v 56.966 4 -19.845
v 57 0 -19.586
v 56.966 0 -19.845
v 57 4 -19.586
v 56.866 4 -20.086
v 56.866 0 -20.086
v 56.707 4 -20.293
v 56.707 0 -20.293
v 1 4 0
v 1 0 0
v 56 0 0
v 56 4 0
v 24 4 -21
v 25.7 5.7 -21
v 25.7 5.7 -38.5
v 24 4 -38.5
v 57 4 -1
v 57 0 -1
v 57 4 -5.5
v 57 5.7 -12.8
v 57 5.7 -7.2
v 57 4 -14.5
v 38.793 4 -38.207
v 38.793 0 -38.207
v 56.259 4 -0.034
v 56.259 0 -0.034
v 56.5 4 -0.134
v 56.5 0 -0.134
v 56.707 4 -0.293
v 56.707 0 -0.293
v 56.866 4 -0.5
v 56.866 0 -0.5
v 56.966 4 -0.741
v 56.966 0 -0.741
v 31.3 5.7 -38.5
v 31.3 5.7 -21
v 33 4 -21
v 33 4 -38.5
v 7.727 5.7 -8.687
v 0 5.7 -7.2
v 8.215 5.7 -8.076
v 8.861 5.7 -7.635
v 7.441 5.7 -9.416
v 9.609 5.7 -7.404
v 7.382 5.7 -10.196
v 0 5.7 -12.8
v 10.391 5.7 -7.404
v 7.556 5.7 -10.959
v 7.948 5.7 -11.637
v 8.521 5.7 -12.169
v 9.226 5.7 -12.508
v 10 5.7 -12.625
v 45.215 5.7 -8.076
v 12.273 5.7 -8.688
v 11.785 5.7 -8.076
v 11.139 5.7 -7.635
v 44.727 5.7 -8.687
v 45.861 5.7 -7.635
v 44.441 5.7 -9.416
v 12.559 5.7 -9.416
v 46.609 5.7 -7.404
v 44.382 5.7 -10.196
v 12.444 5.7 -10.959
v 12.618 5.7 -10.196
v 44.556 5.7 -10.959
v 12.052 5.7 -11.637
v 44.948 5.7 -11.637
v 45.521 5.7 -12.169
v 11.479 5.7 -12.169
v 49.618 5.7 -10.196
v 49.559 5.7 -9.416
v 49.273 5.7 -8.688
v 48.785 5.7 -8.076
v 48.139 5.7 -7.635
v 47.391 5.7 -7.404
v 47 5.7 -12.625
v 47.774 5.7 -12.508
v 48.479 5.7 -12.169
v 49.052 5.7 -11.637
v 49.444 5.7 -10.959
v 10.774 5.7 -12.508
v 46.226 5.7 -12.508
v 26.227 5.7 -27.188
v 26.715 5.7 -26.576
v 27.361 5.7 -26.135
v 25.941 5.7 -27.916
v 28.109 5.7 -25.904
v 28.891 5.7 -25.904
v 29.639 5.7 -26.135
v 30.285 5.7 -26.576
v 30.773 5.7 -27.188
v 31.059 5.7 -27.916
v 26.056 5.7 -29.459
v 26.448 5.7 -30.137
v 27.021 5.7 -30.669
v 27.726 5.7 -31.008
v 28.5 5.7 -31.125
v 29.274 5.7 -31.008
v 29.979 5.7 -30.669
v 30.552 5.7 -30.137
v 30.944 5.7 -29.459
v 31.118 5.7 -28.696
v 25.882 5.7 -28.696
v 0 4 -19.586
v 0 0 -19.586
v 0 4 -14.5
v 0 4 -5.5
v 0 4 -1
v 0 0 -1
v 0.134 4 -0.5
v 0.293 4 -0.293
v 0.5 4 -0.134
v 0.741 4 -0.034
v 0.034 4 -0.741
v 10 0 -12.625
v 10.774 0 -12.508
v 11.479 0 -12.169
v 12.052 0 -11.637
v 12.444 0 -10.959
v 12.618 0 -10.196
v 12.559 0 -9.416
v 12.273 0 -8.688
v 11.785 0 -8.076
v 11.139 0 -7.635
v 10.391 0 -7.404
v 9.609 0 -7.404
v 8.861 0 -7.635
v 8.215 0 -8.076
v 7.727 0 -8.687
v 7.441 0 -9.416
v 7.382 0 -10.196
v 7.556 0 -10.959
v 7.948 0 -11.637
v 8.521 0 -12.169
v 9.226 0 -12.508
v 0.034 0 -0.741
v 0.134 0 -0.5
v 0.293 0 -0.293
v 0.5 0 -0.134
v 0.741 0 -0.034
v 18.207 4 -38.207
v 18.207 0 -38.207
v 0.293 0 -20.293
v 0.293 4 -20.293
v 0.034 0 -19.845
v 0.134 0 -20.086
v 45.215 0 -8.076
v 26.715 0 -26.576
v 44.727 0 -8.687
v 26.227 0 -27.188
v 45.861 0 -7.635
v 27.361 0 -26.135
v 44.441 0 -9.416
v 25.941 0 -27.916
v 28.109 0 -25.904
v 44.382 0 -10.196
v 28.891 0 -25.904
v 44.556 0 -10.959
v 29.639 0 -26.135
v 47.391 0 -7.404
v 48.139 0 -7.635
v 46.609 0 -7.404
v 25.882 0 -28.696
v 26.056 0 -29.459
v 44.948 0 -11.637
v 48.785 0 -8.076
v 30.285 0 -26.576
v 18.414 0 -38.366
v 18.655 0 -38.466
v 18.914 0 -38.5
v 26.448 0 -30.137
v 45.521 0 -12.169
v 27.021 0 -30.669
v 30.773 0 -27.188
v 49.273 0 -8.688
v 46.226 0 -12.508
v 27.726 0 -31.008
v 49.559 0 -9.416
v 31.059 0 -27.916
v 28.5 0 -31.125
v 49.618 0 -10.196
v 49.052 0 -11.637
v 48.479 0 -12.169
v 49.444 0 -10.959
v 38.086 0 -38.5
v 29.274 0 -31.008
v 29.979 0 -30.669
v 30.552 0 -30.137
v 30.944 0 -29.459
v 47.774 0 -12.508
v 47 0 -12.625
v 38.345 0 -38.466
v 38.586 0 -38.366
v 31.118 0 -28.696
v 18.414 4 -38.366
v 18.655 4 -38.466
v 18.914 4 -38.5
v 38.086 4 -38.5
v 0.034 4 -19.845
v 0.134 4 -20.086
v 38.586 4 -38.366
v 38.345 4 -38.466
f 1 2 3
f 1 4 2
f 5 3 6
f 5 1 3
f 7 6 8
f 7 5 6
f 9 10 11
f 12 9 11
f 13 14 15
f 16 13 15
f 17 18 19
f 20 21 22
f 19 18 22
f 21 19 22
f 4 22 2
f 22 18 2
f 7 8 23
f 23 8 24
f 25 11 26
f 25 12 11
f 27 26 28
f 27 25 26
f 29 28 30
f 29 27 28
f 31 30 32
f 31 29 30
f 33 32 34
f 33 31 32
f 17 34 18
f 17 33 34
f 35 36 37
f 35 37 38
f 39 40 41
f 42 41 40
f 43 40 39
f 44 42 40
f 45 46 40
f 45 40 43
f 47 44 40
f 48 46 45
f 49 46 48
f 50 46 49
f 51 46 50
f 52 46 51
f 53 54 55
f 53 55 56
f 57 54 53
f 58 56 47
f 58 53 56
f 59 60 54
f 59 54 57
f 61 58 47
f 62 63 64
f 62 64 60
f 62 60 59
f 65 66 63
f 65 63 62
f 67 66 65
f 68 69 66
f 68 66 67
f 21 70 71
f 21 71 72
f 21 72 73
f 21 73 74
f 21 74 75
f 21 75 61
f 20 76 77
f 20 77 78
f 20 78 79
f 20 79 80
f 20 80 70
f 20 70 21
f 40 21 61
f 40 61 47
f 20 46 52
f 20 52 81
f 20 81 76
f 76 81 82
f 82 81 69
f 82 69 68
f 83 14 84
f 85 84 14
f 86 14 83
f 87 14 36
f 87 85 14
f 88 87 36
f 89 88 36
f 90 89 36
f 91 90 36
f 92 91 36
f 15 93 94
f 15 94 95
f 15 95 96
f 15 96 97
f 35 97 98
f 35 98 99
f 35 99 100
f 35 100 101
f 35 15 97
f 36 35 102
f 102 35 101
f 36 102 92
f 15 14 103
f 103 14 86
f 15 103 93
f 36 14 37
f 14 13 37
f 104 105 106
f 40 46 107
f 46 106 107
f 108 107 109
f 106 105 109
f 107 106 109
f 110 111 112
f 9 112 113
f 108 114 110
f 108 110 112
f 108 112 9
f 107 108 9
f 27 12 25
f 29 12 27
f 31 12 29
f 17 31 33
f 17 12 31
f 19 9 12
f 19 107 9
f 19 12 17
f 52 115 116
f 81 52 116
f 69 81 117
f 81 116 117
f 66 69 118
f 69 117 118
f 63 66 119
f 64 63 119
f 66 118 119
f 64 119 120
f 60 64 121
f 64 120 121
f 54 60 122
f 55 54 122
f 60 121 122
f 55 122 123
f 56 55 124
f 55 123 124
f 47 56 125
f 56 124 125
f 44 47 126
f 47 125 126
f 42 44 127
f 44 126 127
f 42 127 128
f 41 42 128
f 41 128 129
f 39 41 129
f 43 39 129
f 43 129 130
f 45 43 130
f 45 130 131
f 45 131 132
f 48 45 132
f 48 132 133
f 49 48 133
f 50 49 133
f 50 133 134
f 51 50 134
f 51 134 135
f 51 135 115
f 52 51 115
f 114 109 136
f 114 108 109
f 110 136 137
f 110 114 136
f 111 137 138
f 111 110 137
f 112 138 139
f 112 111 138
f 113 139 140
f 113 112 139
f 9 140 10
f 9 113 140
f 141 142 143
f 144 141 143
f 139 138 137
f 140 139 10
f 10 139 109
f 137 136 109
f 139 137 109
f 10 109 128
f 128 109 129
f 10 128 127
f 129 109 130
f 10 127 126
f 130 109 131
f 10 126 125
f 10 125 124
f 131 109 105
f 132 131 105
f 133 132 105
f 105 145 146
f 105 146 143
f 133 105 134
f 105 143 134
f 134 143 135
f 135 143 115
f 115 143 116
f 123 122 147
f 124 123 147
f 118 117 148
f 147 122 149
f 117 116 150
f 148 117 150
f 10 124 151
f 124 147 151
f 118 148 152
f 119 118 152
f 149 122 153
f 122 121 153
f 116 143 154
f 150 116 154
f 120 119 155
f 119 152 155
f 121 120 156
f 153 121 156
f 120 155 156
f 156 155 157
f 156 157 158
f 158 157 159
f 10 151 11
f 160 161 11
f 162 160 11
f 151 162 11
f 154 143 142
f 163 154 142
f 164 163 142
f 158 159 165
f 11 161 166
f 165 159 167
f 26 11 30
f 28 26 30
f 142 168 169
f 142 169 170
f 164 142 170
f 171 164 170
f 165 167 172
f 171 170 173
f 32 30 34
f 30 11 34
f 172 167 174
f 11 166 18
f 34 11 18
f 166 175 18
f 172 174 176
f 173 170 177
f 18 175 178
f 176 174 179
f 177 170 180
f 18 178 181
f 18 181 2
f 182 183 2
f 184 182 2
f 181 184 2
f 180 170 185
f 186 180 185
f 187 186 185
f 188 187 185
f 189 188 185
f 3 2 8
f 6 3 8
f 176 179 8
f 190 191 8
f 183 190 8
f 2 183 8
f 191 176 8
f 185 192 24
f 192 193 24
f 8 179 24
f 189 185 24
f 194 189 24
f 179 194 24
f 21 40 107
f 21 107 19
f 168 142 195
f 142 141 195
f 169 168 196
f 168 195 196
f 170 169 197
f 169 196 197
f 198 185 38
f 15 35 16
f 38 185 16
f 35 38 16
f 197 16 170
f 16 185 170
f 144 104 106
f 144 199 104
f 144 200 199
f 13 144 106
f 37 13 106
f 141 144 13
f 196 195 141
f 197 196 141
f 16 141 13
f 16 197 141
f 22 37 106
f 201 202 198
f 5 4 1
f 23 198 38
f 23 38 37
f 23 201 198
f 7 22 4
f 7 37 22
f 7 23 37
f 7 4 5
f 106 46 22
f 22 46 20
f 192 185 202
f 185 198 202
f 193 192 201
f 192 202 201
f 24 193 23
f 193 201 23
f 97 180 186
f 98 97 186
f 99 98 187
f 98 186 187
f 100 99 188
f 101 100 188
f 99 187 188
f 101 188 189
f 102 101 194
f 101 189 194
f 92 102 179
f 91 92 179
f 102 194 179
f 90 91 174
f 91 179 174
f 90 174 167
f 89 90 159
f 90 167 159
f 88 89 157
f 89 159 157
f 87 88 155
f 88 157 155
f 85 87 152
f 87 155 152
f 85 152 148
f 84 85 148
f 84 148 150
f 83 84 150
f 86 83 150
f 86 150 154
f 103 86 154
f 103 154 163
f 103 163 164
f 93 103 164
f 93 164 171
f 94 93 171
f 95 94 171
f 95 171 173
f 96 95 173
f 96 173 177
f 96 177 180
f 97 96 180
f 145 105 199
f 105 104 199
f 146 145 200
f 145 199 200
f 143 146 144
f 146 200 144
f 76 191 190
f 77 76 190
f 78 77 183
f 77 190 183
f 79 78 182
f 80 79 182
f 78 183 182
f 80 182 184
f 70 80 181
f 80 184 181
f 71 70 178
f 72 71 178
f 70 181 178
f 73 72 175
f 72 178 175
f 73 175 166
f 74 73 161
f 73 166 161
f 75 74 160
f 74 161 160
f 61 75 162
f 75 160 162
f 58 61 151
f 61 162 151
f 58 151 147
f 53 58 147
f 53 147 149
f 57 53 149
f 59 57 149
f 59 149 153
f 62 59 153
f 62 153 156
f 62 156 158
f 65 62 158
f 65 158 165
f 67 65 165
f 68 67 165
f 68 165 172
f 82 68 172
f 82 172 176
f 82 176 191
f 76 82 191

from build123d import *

# Parameters (mm, degrees)
BOSS_EXTRUDE1_DEPTH = 4
SKETCH2_W           = 9
SKETCH2_H           = 17.5
SKETCH2_W_2         = 57
SKETCH2_H_2         = 9
BOSS_EXTRUDE2_DEPTH = 1.7
CHAMFER1_SIZE       = 1.7
SKETCH4_R           = 2.625
CUT_EXTRUDE1_DEPTH  = 70.019852217
FILLET1_R           = 1


with BuildPart() as part:
    # Sketch1 → Boss-Extrude1 (new body)
    with BuildSketch(Plane(origin=(0, 0, 0), x_dir=(1, 0, 0), z_dir=(0, 1, 0))):
        Polygon((0, 0), (57, 0), (57, 20), (38.5, 38.5), (18.5, 38.5), (0, 20), align=None)
    extrude(amount=BOSS_EXTRUDE1_DEPTH)

    # Sketch2 → Boss-Extrude2 (add)
    with BuildSketch(Plane(origin=(0, 4, 0), x_dir=(1, 0, 0), z_dir=(0, 1, 0))):
        with Locations((28.5, 29.75)):
            Rectangle(SKETCH2_W, SKETCH2_H)
        with Locations((28.5, 10)):
            Rectangle(SKETCH2_W_2, SKETCH2_H_2)
    extrude(amount=BOSS_EXTRUDE2_DEPTH)

    # Chamfer1
    chamfer1_edges = [part.edges().sort_by_distance(p)[0] for p in [
        (33, 5.7, -29.75),
        (28.5, 5.7, -14.5),
        (24, 5.7, -29.75),
        (28.5, 5.7, -5.5),
    ]]
    chamfer(chamfer1_edges, length=CHAMFER1_SIZE - 0.0001)  # a hair under: the kernel refuses the full size

    # Sketch4 → Cut-Extrude1 (cut, through all)
    with BuildSketch(Plane.XZ):
        with Locations(Location((10, -10, 0), (0, 0, 270))):
            Circle(SKETCH4_R)
        with Locations(Location((47, -10, 0), (0, 0, 270))):
            Circle(SKETCH4_R)
        with Locations(Location((28.5, -28.5, 0), (0, 0, 270))):
            Circle(SKETCH4_R)
    extrude(amount=-CUT_EXTRUDE1_DEPTH, mode=Mode.SUBTRACT)

    # Fillet1
    fillet1_edges = [part.edges().sort_by_distance(p)[0] for p in [
        (0, 2, -20),
        (18.5, 2, -38.5),
        (38.5, 2, -38.5),
        (57, 2, -20),
        (57, 2, 0),
        (0, 2, 0),
    ]]
    fillet(fillet1_edges, radius=FILLET1_R)


solid = part.part
